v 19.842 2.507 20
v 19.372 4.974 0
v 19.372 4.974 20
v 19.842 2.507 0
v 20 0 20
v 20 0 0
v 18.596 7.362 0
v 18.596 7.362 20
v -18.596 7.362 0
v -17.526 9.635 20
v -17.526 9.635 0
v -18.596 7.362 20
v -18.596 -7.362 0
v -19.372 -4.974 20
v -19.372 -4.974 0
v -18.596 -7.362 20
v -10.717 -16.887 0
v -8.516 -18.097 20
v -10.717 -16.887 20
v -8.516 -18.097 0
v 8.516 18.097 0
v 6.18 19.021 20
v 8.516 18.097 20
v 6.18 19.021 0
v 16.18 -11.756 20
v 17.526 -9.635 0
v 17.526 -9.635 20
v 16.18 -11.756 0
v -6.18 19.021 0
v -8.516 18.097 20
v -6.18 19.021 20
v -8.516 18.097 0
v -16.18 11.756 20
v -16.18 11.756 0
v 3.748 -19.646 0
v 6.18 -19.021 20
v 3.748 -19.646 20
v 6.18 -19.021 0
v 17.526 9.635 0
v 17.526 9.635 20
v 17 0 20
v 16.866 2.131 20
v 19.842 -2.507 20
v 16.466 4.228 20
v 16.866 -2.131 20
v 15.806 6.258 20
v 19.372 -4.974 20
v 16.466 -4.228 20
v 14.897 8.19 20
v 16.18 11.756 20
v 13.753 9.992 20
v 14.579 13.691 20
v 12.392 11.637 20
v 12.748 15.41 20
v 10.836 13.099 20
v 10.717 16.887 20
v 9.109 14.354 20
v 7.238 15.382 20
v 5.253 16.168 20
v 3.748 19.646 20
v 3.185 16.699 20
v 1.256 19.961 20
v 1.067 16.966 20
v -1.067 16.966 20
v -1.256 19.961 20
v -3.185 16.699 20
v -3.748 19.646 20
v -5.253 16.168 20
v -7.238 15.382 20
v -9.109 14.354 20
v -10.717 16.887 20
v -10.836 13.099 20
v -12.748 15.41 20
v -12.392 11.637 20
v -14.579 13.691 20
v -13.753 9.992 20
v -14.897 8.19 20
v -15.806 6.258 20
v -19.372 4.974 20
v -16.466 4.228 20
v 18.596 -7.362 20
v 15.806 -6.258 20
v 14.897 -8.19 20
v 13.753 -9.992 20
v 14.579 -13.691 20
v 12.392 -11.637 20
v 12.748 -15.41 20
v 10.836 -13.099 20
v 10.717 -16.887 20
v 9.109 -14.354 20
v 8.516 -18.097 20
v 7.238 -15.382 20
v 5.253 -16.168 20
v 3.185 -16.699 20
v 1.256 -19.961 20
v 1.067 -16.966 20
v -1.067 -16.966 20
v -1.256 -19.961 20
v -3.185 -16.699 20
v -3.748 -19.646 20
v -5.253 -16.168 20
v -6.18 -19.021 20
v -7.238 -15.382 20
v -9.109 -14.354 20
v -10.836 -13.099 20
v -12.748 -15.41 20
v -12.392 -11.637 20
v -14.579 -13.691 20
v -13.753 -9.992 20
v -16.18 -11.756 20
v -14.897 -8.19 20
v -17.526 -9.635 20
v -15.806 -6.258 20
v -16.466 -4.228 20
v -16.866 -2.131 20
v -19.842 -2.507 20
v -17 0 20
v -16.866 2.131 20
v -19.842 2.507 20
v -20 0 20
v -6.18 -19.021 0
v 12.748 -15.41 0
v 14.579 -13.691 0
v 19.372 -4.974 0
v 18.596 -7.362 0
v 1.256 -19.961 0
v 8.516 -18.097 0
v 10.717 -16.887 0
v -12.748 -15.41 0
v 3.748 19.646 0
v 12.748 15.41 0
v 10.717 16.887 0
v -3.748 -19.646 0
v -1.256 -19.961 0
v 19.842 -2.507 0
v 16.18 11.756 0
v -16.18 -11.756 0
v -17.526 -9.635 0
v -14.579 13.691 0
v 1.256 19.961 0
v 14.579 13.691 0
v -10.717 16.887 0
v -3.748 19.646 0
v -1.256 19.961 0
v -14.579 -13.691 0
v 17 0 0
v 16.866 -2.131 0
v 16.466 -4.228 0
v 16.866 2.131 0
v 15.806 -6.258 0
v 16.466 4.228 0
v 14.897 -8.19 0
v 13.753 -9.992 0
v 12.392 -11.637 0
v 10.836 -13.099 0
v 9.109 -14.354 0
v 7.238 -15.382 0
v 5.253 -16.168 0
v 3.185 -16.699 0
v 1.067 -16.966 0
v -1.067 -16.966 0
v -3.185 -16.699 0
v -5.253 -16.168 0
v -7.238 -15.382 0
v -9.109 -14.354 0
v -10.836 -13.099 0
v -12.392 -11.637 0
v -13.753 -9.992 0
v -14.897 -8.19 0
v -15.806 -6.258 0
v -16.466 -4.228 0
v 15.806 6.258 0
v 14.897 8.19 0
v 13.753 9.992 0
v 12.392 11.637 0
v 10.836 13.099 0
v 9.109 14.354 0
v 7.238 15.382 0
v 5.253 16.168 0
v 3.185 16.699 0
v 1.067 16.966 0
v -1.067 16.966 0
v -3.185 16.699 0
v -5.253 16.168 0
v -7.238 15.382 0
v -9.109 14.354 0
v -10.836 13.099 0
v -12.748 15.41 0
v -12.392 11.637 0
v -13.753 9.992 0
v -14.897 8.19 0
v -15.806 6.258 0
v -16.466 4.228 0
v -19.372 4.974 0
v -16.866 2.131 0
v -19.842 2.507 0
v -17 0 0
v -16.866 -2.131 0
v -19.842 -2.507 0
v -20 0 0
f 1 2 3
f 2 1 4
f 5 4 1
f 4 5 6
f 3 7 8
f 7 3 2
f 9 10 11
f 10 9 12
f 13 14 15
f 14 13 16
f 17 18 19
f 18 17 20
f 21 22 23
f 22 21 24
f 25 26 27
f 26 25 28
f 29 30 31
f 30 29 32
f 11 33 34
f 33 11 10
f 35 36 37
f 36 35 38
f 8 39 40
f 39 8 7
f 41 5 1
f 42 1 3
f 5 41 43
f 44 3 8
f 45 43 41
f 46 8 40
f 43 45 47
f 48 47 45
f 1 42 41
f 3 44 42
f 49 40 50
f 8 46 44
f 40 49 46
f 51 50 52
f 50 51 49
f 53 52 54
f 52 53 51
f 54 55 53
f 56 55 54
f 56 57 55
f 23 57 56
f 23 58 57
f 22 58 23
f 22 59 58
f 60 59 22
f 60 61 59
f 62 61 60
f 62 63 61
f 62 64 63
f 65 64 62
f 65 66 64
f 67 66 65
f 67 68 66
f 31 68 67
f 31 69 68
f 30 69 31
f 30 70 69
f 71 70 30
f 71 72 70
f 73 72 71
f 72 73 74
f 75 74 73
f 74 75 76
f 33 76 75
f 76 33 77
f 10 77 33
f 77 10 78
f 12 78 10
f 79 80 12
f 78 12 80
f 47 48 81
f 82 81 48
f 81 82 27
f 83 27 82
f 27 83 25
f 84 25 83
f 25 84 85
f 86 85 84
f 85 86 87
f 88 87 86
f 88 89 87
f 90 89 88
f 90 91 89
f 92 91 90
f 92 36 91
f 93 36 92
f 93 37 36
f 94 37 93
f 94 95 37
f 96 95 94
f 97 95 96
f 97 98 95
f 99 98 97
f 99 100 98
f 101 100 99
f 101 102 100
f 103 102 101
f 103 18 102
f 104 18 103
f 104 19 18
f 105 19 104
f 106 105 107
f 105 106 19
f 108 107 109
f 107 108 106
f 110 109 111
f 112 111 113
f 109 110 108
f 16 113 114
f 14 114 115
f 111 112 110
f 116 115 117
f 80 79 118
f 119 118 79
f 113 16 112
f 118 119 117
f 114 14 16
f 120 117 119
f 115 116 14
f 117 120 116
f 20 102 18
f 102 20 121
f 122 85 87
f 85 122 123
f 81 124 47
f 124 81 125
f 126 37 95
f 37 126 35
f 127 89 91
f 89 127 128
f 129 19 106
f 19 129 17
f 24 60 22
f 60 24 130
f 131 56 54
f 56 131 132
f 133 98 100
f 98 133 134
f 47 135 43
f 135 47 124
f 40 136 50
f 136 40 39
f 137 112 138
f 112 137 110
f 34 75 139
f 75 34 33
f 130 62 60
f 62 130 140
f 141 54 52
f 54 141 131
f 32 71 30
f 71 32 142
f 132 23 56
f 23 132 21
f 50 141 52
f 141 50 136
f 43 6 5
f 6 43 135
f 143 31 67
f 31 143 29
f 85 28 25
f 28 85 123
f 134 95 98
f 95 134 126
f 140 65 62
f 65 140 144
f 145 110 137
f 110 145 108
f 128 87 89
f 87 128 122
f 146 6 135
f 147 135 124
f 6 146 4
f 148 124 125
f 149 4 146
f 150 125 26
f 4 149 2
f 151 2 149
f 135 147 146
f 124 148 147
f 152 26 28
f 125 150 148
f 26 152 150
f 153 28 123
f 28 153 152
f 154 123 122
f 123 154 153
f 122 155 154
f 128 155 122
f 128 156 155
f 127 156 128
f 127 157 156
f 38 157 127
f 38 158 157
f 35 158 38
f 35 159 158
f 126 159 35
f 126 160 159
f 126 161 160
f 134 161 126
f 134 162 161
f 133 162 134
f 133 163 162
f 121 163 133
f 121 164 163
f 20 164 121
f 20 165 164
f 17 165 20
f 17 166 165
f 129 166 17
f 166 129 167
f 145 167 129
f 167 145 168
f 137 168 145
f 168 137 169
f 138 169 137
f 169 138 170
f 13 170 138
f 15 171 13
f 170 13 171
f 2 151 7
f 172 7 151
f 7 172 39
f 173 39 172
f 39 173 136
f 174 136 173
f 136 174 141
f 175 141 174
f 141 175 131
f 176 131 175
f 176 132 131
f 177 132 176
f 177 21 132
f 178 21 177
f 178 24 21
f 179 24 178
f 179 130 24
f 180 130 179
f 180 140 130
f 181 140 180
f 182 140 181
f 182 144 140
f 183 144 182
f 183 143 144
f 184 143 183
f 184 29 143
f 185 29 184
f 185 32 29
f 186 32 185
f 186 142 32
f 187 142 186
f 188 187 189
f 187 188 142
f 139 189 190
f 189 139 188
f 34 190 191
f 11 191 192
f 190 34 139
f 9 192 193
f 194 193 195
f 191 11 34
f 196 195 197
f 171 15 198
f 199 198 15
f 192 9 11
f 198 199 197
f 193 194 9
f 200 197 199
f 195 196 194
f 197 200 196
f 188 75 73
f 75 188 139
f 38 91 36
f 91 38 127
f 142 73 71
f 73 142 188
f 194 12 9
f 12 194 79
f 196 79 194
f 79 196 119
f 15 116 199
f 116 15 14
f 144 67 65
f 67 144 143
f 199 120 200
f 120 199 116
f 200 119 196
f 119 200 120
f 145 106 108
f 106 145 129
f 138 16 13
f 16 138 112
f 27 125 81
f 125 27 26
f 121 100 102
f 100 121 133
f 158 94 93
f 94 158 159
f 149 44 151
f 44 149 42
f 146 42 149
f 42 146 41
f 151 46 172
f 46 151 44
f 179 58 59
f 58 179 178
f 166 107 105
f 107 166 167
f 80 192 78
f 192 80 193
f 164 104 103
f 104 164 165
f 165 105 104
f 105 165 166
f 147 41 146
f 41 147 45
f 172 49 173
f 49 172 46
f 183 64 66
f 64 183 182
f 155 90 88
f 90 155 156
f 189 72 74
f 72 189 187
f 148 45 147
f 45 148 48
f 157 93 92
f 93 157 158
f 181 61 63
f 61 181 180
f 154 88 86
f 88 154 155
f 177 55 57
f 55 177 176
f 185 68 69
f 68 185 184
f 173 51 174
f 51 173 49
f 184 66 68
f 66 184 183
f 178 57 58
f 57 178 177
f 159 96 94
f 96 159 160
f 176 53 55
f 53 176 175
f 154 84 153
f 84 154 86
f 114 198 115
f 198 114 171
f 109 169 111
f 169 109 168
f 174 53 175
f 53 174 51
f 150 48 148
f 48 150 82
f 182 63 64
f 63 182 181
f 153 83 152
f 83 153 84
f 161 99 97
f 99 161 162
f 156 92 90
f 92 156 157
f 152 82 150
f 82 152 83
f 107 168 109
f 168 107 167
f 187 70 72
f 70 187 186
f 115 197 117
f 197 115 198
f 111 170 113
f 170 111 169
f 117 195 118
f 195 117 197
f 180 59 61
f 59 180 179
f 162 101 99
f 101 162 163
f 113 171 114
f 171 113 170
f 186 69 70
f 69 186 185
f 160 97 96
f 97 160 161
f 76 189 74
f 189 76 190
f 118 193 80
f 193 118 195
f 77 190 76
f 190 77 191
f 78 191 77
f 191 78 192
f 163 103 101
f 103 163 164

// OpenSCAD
$fn=50;
difference() {
	cylinder(r=20, h=20);
	cylinder(r=17, h=20);
}
